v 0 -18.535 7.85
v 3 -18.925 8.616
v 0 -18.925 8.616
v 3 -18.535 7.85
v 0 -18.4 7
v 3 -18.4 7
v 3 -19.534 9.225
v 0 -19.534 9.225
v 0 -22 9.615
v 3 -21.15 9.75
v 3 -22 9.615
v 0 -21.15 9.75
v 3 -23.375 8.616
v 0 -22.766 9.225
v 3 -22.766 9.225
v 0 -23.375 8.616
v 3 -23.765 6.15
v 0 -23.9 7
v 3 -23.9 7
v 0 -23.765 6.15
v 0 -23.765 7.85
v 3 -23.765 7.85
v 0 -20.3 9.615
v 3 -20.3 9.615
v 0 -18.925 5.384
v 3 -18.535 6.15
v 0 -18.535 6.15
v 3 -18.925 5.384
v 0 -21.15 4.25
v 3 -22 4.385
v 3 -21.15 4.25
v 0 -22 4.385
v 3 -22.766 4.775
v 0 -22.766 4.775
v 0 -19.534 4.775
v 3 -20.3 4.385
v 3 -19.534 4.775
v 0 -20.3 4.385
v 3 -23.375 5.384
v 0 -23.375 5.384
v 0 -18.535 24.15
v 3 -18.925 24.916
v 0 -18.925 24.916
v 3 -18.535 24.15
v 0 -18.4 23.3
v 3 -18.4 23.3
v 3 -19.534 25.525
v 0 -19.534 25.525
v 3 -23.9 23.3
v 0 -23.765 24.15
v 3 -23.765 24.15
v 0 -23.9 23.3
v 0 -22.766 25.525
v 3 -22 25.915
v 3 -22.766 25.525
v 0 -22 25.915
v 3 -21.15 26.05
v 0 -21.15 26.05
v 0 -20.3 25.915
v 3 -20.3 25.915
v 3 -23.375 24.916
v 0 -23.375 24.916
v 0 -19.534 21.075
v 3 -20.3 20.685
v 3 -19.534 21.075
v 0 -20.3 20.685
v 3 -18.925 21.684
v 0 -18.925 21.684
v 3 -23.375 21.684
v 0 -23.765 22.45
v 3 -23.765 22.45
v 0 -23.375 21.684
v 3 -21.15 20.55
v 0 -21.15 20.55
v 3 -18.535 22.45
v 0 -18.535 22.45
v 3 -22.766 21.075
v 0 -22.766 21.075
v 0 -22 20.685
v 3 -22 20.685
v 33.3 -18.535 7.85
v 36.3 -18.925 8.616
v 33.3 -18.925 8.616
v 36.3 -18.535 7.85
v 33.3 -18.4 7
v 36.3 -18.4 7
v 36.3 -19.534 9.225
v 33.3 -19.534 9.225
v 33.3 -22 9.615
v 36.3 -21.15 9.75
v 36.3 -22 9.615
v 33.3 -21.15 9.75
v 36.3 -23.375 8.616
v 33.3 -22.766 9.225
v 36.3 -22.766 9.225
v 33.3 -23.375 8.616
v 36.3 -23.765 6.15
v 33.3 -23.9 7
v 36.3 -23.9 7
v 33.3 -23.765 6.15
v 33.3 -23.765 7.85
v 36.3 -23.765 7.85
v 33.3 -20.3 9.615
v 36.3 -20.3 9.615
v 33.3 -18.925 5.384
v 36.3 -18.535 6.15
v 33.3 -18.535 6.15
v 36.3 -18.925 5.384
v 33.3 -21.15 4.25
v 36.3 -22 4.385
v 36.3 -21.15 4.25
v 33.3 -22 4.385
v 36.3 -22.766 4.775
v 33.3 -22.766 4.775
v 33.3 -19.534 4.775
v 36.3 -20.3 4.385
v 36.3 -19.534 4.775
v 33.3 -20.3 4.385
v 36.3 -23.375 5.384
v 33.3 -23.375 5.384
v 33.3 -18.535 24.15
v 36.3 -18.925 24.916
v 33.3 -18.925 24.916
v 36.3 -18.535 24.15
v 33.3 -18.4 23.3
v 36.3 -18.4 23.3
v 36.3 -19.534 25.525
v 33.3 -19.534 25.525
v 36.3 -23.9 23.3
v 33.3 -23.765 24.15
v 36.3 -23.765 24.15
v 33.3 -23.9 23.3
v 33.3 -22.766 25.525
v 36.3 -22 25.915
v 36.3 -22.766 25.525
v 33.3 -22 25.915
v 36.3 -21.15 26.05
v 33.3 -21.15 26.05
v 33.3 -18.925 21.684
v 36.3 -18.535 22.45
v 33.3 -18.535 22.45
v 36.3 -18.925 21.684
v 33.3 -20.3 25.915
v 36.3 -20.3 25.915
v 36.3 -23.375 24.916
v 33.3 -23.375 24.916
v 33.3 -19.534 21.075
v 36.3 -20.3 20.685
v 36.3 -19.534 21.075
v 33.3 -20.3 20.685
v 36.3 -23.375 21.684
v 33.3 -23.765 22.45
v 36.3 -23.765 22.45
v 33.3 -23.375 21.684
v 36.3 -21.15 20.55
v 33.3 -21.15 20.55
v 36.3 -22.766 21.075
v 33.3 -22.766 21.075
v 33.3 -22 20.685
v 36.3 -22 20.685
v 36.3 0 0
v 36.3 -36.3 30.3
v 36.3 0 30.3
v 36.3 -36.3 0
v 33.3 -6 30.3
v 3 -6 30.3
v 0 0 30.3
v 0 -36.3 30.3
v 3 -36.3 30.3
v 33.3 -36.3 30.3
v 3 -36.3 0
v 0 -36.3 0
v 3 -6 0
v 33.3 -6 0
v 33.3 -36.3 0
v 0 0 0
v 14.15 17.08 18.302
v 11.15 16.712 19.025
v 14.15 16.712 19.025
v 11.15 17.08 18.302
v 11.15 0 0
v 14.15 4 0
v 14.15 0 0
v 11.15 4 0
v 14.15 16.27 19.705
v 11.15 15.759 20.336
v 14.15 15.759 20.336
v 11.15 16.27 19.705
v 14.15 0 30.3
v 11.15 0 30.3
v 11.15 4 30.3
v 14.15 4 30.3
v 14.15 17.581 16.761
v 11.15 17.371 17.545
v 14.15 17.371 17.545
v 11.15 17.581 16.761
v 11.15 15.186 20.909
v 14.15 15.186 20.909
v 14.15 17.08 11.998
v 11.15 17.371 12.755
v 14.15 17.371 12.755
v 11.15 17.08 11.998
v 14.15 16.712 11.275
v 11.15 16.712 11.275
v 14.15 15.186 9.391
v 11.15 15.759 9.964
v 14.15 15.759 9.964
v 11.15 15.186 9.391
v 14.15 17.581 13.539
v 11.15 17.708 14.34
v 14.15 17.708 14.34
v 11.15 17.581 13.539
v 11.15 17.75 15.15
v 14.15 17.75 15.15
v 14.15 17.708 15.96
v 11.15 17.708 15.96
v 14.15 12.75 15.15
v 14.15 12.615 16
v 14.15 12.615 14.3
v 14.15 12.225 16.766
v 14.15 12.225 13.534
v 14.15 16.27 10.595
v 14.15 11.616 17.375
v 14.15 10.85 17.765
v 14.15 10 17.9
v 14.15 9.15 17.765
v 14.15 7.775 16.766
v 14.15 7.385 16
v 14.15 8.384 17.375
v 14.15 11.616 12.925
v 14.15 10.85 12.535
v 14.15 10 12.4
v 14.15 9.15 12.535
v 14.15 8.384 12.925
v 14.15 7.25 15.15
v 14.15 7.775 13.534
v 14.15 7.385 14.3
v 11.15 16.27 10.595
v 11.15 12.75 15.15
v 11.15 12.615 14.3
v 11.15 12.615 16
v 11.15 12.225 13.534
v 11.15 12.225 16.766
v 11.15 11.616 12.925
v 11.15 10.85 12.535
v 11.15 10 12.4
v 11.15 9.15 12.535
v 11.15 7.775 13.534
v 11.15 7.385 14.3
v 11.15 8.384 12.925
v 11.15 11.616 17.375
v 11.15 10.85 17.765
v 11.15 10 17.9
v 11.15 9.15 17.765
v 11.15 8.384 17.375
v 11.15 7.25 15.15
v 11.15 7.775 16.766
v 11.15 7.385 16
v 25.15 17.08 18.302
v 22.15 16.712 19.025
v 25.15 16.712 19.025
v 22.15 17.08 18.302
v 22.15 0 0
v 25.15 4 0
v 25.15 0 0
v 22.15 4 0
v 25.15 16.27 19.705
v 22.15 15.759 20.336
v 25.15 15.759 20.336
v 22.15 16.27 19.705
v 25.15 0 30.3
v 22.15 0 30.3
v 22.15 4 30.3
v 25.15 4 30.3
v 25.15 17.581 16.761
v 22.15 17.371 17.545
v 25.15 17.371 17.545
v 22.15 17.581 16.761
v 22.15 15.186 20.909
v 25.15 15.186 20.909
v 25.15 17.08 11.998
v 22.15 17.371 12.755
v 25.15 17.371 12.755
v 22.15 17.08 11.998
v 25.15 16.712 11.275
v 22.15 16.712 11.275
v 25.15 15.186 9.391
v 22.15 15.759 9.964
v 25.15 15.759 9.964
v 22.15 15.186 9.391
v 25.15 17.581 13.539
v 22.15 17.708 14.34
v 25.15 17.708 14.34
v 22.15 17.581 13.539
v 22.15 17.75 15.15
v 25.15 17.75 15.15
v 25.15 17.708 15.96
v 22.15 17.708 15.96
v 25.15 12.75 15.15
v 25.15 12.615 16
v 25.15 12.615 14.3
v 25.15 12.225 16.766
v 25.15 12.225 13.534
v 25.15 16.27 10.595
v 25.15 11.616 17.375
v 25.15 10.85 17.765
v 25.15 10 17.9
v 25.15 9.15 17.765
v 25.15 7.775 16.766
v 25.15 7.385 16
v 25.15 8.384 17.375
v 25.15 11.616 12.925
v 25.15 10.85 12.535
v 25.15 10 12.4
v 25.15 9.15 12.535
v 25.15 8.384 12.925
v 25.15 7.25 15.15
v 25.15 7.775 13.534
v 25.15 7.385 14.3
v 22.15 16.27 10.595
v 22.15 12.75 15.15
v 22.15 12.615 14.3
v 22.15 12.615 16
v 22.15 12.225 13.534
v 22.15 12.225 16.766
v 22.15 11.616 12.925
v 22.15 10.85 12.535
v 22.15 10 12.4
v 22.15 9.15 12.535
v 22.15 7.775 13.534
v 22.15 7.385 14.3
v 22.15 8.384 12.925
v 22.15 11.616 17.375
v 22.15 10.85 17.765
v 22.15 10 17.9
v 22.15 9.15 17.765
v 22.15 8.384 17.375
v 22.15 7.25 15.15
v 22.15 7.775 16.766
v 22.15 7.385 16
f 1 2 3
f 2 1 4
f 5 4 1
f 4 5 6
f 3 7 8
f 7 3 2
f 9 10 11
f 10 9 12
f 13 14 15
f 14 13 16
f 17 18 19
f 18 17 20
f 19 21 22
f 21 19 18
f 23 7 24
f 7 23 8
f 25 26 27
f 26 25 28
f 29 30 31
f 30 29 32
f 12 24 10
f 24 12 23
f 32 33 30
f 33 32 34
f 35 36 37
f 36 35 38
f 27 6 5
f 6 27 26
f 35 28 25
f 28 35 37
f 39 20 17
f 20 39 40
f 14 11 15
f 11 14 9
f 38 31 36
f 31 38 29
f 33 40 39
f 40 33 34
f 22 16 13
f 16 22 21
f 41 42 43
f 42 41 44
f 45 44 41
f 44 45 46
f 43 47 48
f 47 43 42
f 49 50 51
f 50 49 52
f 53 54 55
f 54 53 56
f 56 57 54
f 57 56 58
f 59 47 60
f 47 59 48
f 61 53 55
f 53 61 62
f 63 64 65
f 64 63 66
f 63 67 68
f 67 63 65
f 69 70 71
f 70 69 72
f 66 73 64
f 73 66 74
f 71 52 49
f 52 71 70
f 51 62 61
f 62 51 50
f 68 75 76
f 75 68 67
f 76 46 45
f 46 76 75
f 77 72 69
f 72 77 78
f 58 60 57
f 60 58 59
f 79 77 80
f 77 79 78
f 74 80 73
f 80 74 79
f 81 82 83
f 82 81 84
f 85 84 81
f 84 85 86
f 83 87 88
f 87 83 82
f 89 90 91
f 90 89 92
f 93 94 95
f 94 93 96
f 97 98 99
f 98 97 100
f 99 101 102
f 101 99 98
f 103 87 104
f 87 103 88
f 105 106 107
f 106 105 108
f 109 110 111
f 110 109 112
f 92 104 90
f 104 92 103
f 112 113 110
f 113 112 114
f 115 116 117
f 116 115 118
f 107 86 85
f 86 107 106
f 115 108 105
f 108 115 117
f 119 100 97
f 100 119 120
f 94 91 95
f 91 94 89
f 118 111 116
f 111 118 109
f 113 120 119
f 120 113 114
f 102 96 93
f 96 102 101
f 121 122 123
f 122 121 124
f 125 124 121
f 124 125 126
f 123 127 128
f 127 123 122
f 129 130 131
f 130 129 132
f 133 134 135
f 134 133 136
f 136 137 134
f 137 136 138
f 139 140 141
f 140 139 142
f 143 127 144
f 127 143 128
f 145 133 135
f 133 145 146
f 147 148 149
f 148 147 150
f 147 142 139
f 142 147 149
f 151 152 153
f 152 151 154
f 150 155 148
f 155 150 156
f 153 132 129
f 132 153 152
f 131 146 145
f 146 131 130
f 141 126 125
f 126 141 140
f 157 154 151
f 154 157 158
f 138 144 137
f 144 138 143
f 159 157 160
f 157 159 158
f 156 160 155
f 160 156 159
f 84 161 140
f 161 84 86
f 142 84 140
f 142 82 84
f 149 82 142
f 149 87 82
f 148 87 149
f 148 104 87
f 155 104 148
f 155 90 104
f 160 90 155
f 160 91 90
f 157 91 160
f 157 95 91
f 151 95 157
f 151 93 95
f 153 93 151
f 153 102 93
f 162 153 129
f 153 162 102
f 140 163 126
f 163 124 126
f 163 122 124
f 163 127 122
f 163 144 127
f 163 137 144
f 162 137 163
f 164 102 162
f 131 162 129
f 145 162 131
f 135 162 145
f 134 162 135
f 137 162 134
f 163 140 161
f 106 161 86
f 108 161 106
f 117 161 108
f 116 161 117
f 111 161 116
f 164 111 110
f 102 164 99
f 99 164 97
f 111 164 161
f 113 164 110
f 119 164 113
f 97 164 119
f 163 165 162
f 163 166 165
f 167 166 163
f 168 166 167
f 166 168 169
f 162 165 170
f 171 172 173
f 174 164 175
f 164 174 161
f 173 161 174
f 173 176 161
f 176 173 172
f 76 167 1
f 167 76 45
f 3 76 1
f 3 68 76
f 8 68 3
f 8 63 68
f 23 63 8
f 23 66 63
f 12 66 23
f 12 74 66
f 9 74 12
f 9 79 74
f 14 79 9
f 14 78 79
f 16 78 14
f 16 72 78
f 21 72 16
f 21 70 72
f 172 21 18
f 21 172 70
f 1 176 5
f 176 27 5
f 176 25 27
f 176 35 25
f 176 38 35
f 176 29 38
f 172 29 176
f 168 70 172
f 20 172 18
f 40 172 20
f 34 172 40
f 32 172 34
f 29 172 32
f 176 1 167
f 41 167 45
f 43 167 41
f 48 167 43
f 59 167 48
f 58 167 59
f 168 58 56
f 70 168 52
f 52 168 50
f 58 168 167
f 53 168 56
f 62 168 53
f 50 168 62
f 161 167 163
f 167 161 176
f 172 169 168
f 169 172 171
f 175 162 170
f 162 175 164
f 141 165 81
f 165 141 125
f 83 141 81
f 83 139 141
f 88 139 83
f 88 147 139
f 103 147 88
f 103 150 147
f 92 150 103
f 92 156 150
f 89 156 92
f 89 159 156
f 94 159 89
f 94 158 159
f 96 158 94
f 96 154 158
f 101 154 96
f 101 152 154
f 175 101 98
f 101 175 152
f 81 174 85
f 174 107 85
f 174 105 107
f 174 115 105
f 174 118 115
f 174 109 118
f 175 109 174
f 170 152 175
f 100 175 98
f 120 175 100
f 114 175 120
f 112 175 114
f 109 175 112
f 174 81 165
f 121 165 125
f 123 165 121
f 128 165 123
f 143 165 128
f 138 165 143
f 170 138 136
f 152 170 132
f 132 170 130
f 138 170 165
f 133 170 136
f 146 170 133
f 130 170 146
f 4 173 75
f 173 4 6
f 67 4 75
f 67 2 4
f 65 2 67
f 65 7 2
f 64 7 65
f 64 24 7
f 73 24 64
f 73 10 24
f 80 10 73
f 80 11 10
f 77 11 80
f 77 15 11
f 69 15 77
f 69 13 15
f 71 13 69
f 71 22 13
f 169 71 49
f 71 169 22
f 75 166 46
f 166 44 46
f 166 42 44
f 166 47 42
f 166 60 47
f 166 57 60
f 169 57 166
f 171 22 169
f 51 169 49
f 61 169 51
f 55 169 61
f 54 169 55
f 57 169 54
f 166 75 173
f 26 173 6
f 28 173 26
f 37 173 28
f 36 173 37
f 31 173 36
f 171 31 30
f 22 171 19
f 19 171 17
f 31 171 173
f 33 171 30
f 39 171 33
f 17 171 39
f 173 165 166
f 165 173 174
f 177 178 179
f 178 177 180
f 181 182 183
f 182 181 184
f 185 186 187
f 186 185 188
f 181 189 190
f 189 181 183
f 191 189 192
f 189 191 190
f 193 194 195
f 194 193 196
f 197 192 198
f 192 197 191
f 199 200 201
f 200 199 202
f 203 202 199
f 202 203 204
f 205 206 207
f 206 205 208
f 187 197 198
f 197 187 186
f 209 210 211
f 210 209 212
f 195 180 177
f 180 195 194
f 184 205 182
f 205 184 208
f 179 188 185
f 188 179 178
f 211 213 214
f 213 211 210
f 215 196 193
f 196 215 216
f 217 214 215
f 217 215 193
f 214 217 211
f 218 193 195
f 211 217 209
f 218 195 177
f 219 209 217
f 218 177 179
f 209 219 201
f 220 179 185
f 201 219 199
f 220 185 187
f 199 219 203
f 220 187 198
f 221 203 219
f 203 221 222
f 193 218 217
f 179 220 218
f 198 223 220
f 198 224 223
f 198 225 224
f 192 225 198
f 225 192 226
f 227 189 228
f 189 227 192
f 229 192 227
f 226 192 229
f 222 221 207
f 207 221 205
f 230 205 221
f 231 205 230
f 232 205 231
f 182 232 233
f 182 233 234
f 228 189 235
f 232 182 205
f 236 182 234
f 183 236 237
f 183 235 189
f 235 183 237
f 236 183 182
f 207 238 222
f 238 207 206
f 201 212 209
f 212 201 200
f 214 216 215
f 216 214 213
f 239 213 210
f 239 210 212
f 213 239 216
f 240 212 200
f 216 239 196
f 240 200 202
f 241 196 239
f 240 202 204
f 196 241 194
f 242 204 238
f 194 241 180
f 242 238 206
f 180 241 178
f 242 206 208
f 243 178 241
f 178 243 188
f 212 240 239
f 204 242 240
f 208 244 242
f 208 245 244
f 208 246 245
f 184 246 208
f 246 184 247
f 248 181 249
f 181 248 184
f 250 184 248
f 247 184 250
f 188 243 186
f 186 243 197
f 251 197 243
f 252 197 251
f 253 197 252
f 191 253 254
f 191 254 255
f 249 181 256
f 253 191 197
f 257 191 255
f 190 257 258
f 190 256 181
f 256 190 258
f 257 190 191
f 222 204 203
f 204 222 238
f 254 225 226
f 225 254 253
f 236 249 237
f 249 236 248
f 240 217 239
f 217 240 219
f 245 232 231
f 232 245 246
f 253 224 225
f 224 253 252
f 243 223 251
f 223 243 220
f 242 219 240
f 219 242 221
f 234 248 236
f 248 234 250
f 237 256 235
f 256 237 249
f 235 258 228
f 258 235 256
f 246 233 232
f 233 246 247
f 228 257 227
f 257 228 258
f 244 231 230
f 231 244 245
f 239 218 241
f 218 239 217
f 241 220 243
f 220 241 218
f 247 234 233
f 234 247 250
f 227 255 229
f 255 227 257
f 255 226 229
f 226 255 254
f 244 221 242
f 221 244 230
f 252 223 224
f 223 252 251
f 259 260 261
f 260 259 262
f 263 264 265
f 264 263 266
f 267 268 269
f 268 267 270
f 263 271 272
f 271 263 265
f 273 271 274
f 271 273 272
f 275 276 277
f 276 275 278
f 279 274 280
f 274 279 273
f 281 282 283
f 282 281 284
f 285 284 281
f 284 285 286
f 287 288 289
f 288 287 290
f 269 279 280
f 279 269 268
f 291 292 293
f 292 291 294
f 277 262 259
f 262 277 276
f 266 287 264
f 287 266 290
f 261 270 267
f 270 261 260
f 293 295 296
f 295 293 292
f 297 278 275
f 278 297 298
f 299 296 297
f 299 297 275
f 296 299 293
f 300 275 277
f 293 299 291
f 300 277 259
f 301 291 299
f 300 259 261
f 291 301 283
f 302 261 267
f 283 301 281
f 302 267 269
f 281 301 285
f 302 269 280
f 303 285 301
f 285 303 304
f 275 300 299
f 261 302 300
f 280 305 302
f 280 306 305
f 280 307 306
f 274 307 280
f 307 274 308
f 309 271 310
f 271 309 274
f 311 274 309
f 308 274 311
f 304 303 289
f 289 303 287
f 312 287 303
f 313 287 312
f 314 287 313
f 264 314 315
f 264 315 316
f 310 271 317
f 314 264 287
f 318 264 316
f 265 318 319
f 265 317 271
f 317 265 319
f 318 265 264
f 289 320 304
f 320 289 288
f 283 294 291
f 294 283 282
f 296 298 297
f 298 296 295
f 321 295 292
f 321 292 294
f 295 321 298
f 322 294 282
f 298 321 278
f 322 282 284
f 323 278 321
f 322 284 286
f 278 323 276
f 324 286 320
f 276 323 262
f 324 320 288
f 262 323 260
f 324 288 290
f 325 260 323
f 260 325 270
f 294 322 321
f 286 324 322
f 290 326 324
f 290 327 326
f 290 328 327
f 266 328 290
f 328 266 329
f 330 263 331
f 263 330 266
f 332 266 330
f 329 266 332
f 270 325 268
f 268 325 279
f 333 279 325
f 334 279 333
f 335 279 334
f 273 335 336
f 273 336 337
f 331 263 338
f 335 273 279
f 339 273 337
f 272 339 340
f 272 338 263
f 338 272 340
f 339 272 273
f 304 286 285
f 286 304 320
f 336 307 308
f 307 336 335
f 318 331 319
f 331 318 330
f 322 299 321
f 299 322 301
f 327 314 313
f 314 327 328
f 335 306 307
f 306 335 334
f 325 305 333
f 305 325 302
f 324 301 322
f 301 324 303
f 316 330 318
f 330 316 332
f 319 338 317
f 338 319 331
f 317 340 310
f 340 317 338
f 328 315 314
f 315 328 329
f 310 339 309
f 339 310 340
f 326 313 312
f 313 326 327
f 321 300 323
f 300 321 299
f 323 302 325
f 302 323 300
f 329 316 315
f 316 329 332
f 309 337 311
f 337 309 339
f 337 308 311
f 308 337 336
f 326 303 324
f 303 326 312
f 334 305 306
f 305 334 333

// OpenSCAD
// file: lib/ALU_profile_holder_side.scad
include <../../parameters.scad>

module ALU_profile_holder_side(height) {
    wall_thickness = ALU_profile_holder_wall_thickness;
    
    //díry na přišroubování k Al profilům
    module screws_holes(diameter) {
        translate([0, 0, 7])
            rotate([90, 0, 90])
                cylinder(d=diameter, h=wall_thickness*2, center=true, $fn=20);
        
        translate([0, 0, height-7])
            rotate([90, 0, 90])
                cylinder(d=diameter, h=wall_thickness*2, center=true, $fn=20);
    }
    
    difference() {
        cube([ALU_profile_width+wall_thickness*2, ALU_profile_width + wall_thickness*2, height]);

        translate([wall_thickness, -0.1, -0.1])
            cube([ALU_profile_width, ALU_profile_width + 0.1, height + 0.2]);
        
        translate([wall_thickness*0.5, ALU_profile_width/2, 0]) {
            screws_holes(M5_screw_diameter);
            translate([ALU_profile_width+wall_thickness, 0, 0]) {
                screws_holes(M5_screw_diameter);
            }
        }
    }
}

ALU_profile_holder_side(30);
// file: ../parameters.scad
maximum_printable_size = 150;

layer_thickness = 0.3;
global_clearance = 0.5;

platform_base_diameter = 400; // Průměr ukotvení válců spodní platformy
platform_base_thickness = 20;
platform_cylinder_medium_length = 250;  // délka pneumatického válce s pístem vysunutým do poloviny rozsahu
platform_base_cylinder_spacing = 38;    //rozestupy spodního a horního ukotvení válců.
platform_top_cylinder_spacing = 30;
platform_top_diameter = 150;   // Průměr horní základny (vdálenost od středu základny do středu kulového kloubu ke kterému je uchycen pneumatický válec)


// screw length step - minimum difference in length between two types of screws
basic_screw_length = 5;


//Screw diameter and nut for M10 [mm]
M10_screw_diameter = 10.4;
M10_head_height = 10;
M10_head_diameter = 16+0.5;
M10_nut_height = 10.5;
M10_nut_diameter = 25.5;
M10_nut_pocket = 22.3;

//Screw diameter for M8 [mm]
M8_screw_diameter = 8.6;
M8_head_height = 8;
M8_head_diameter = 13.5;
M8_nut_height = 7.5;
M8_square_nut_thin_height = 4.5;
M8_nut_diameter = 14.4 + 0.5;
M8_nut_pocket = 13 + 0.5;
M8_washer_diameter = 16;
M8_washer_thickness = 1.5;


//Screw diameter and nut for M6 [mm]
M6_screw_diameter=6.5;
M6_head_diameter = 10+0.5;
M6_head_height = 6;
M6_nut_height = 4.9;
M6_nut_diameter = 11.8;
M6_nut_pocket = 10.4;
M6_square_nut_height = 3;
M6_square_nut_diameter = 10;

//Screw diameter and nut for M5 [mm]
M5_screw_diameter=5.5;
M5_head_height = 5;
M5_head_diameter = 13+0.5;
M5_nut_height = 4.5;
M5_nut_diameter = 9.4;
M5_nut_pocket = 8.4;

//Screw diameter and nut for M4 [mm]
M4_screw_diameter=4.5;
M4_screw_head_height = 4;
M4_nut_height = 3.2;
M4_nut_diameter = 8.4;
M4_nut_pocket = 7.5;

//Screw diameter and nut for M3 [mm]
M3_screw_diameter = 3.2;
M3_nut_height = 2.7;
M3_nut_diameter = 6.6;
M3_nut_pocket = 5.6;
M3_screw_head_height = 3;

//Screw diameter and nut for M2,5 [mm]
M2_5_screw_diameter = 2.7;
M2_5_nut_height = 2.3;
M2_5_nut_diameter = 6;
M2_5_nut_pocket = 5.5;

// kulove lozisko

bearing_efsm_08_h = 33+1;
bearing_efsm_08_m = 22;
bearing_efsm_08_db = 18;
bearing_efsm_08_ag = 10.5;
bearing_efsm_08_n = M4_screw_diameter;
bearing_efsm_08_a1 = 5.5;
bearing_efsm_08_d = 8.25;
bearing_efsm_08_B = 8; // ball height

bearing_efsm_10_h = 38+1;
bearing_efsm_10_m = 26;
bearing_efsm_10_db = 21.9;
bearing_efsm_10_ag = 12+0.2;
bearing_efsm_10_n = M5_screw_diameter;
bearing_efsm_10_a1 = 6.5;
bearing_efsm_10_d = 10.25;


bearing_efsm_12_width = 40+1;
bearing_efsm_12_h = bearing_efsm_12_width;
bearing_efsm_12_boltd = 28/2; // polovina vzdalenosti mezi srouby
bearing_efsm_12_m = bearing_efsm_12_boltd*2;
bearing_efsm_12_db = 25;
bearing_efsm_12_ag = 13;
bearing_efsm_12_a1 = 7;
bearing_efsm_12_n = M5_screw_diameter;
bearing_efsm_12_d = 12.15;
bearing_efsm_12_B = 10; // ball height
bearing_efsm_space = 1;

bearing_efsm_17_width = 54+1;
bearing_efsm_17_h = bearing_efsm_17_width;
bearing_efsm_17_boltd = 38/2; // polovina vzdalenosti mezi srouby
bearing_efsm_17_m = bearing_efsm_17_boltd*2;
bearing_efsm_17_db = 35;
bearing_efsm_17_ag = 18;
bearing_efsm_17_n = M6_screw_diameter;
bearing_efsm_17_a1 = 10;
bearing_efsm_17_B = 17; // ball height

//limcove lozisko
bearing_EFOM_10_L=26; //celkova sirka zakladny
bearing_EFOM_10_d1=10.3;//diametr otvoru real=10 mm
bearing_EFOM_10_dB=22;//diametr vystupku pro ulozeni lozika
bearing_EFOM_10_H=52;//celková delka zakladny
bearing_EFOM_10_J=36;// hole pitch
bearing_EFOM_10_A1=6.5;//vyska pouzdra
bearing_EFOM_10_Ag=12;//celkova vyska
bearing_EFOM_10_N1=5;//sirka otvoru pro sroub
bearing_EFOM_10_N2=8;//delka otvoru pro sroub
bearing_EFOM_10_m=36;//roztec der pro sroub
bearing_EFOM_10_h=9;//vyska lozika


608_bearing_outer_diameter = 22.3;
608_bearing_inner_diameter = 16;
608_bearing_thickness = 7.1;


// 20 KG servo parameters

servo_20kg_axis_offset = 9.375; // jak je osa mimo stredu
servo_20kg_body_x = 42;
servo_20kg_body_y = 21;
servo_20kg_body_z = 40;
servo_20kg_thread_x = 49/2;
servo_20kg_thread_y = 10/2;
servo_20kg_body_below = 10; // jak hluboko je tělo serva pod drzaky na srouby
servo_20kg_below = 25.8; // jak hluboko je páka serva pod drzaky na srouby

servo_20kg_bolt_d = 2.5+0.3;
servo_20kg_nut_d = 5+0.3;


//strain gauge
strain_gauge_width = 12.7;
strain_gauge_length = 75.1;
strain_gauge_screw_distance = 10;

//ALU profile
ALU_profile_width = 30.3;
ALU_profile_holder_wall_thickness = 3;
ALU_profile_groove_width = 8;

//pillow block bearing
//https://www.igus.eu/product/372
//Part no. KSTM-08
KSTM08_screws_distance = 33;         //m
KSTM08_screws_holes_diameter = 4.5;  //d2
KSTM08_flange_thickness = 6;         //h3
KSTM08_case_width = 9;               //C1
KSTM08_case_length = 47;             //a
KSTM08_ball_width = 12;              //B


//ložiska pro malý rotor
bearing_outer_diameter = 10.2;    // Rozměr B1 v nákresu s přídavkem na toleranci otvoru
bearing_thickness = 4;        // Rozměr B2 v nákresu
//bearing_shaft_length = 19.5;    // Rozměr B3 v nákresu, Originalni hodnota 19.5
bearing_shaft_length = 20;    // Rozměr B3 v nákresu


//parametry víčka s telemetrickou anténou
S01_sila_materialu=1.2;
S01_vyska_horni_zavit=10;
S01_hloubka_zavitu=4;
S01_prumer_vnitrni=50;
LO_spodni_prumer=17.2;
LO_vyska_bez_krytu=15;
S01_tolerance_zavit=1.5;
R01_vyska_prekryti_statoru=10;
// main file
include <../parameters.scad>
use <./lib/ALU_profile_holder_side.scad>

module 888_5005() {
    joint_width = 8;
    wall_thickness = ALU_profile_holder_wall_thickness;

    translate([0, -ALU_profile_width-ALU_profile_holder_wall_thickness*2, 0])
        ALU_profile_holder_side(ALU_profile_width);

    module holder() {
        difference() {
            hull() {
                cube([3, 4, ALU_profile_width]);

                translate([1.5, 10, ALU_profile_width/2])
                    rotate([0, 90, 0])
                        cylinder(d=M5_screw_diameter+10, h=3, $fn=60, center=true);
            }

            translate([1.5, 10, ALU_profile_width/2])
                rotate([0, 90, 0])
                    cylinder(d=M5_screw_diameter, h=4, $fn=20, center=true);
        }
    }
    translate([(ALU_profile_width+wall_thickness*2)/2-3-joint_width/2, 0, 0])
        holder();
    translate([(ALU_profile_width+wall_thickness*2)/2+joint_width/2, 0, 0])
        holder();
}

888_5005();
